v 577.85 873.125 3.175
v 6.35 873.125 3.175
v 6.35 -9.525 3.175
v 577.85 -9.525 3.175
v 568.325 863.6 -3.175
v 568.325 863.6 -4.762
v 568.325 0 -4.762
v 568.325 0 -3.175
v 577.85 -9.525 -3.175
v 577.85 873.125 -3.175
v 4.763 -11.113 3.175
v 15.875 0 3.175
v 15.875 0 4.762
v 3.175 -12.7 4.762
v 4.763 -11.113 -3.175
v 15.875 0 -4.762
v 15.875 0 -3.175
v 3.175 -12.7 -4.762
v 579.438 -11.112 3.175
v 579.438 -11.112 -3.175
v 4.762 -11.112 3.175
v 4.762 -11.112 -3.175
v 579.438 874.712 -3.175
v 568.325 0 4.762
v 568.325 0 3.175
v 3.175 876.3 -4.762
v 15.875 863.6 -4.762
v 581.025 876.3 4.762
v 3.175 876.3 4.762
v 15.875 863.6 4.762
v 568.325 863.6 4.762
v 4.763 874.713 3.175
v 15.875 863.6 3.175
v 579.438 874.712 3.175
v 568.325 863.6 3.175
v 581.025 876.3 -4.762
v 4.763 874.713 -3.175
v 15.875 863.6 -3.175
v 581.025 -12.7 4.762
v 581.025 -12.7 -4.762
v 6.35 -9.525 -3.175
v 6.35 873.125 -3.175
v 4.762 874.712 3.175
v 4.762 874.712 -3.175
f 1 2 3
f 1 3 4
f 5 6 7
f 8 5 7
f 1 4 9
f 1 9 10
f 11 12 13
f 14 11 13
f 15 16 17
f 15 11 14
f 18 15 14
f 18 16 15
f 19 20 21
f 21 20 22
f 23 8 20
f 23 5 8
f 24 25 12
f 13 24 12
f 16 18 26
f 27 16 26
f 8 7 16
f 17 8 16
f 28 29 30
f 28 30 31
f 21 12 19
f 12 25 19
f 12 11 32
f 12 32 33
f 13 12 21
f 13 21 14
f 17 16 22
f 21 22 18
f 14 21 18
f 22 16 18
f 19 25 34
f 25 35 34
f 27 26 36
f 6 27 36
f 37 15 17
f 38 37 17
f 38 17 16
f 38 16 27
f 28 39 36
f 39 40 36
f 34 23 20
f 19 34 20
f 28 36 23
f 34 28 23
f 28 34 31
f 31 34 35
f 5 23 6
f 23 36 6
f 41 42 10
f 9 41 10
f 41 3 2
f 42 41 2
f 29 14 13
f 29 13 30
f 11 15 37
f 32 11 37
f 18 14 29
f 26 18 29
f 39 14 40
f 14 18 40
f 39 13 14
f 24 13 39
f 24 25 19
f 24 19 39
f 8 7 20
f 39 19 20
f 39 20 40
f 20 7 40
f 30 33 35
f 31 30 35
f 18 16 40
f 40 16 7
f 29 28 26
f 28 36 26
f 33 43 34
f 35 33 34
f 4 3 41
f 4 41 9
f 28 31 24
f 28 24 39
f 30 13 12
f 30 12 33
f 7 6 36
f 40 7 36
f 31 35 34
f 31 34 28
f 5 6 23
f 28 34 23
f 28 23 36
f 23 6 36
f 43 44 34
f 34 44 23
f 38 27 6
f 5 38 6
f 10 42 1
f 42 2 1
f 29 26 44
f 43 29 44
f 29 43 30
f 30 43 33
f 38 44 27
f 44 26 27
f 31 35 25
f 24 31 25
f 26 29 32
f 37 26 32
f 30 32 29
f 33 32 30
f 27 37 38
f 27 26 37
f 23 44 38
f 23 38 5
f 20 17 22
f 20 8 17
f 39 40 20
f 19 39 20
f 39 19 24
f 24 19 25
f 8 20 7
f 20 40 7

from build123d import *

# Parameters (mm, degrees)
SKETCH2_W               = 577.85
SKETCH2_H               = 889
BOSS_EXTRUDE1_DEPTH     = 4.7625
SKETCH3_W               = 552.45
SKETCH3_H               = 863.6
CUT_EXTRUDE1_DEPTH      = 1052.466816523
CUT_EXTRUDE2_DEPTH      = 3.175
CUT_EXTRUDE2_DEPTH_BACK = 3.175
SKETCH4_W               = 574.675
SKETCH4_H               = 885.825
SPLIT1_START            = -4.7625
SPLIT1_DEPTH            = 9.525
SPLIT1_2_DEPTH          = 1.5875
SPLIT1_START_2          = 3.175
SPLIT1_3_DEPTH          = 1.5875
SPLIT1_START_3          = -3.175
SPLIT1_4_DEPTH          = 6.35
SPLIT1_5_DEPTH          = 1.5875
SPLIT1_6_DEPTH          = 1.5875
SPLIT1_7_DEPTH          = 6.35
SPLIT1_8_DEPTH          = 1.5875
SPLIT1_9_DEPTH          = 1.5875
SPLIT1_10_DEPTH         = 6.35
SKETCH6_W               = 571.5
SKETCH6_H               = 882.65
BOSS_EXTRUDE2_DEPTH     = 3.175


# Read off the part's stored shape, not the designer's step: Split1
with BuildPart() as part:
    # Sketch2 → Boss-Extrude1 (new, symmetric)
    with BuildSketch(Plane.XY):
        with Locations((292.1, 431.8)):
            Rectangle(SKETCH2_W, SKETCH2_H)
    extrude(amount=BOSS_EXTRUDE1_DEPTH, both=True)

    # Sketch3 → Cut-Extrude1 (cut, through all)
    with BuildSketch(Plane.XY.offset(4.7625)):
        with Locations((292.1, 431.8)):
            Rectangle(SKETCH3_W, SKETCH3_H)
    extrude(amount=-CUT_EXTRUDE1_DEPTH, mode=Mode.SUBTRACT)

    # Sketch4 → Cut-Extrude2 (cut, two sides: drawn at the far end of the back side and taken through both)
    with BuildSketch(Plane.XY.offset(-CUT_EXTRUDE2_DEPTH_BACK)):
        with Locations((292.1, 431.8)):
            Rectangle(SKETCH4_W, SKETCH4_H)
    extrude(amount=CUT_EXTRUDE2_DEPTH + CUT_EXTRUDE2_DEPTH_BACK, mode=Mode.SUBTRACT)

    # Split1 outline → Split1 (cut)
    with BuildSketch(Plane.XY.offset(SPLIT1_START)):
        Polygon((581.025, 876.3), (3.175, 876.3), (15.875, 863.6), (568.325, 863.6), (568.325, 0), (15.875, 0), (3.175, -12.7), (581.025, -12.7), align=None)
    extrude(amount=SPLIT1_DEPTH, mode=Mode.SUBTRACT)


with BuildPart() as body_2:
    # Split1 2 outline → Split1 2 (new body)
    with BuildSketch(Plane.XY.offset(SPLIT1_START)):
        Polygon((581.025, 876.3), (3.175, 876.3), (15.875, 863.6), (568.325, 863.6), align=None)
    extrude(amount=SPLIT1_2_DEPTH)

    # Split1 3 outline → Split1 3 (add)
    with BuildSketch(Plane.XY.offset(SPLIT1_START_2)):
        Polygon((581.025, 876.3), (3.175, 876.3), (15.875, 863.6), (568.325, 863.6), align=None)
    extrude(amount=SPLIT1_3_DEPTH)

    # Split1 4 outline → Split1 4 (add)
    with BuildSketch(Plane.XY.offset(SPLIT1_START_3)):
        Polygon((579.4375, 874.7125), (581.025, 876.3), (3.175, 876.3), (4.7625, 874.7125), align=None)
    extrude(amount=SPLIT1_4_DEPTH)


with BuildPart() as body_3:
    # Split1 5 outline → Split1 5 (new body)
    with BuildSketch(Plane.XY.offset(SPLIT1_START)):
        Polygon((581.025, -12.7), (581.025, 876.3), (568.325, 863.6), (568.325, 0), align=None)
    extrude(amount=SPLIT1_5_DEPTH)

    # Split1 6 outline → Split1 6 (add)
    with BuildSketch(Plane.XY.offset(SPLIT1_START_2)):
        Polygon((581.025, -12.7), (581.025, 876.3), (568.325, 863.6), (568.325, 0), align=None)
    extrude(amount=SPLIT1_6_DEPTH)

    # Split1 7 outline → Split1 7 (add)
    with BuildSketch(Plane.XY.offset(SPLIT1_START_3)):
        Polygon((579.4375, -11.1125), (581.025, -12.7), (581.025, 876.3), (579.4375, 874.7125), align=None)
    extrude(amount=SPLIT1_7_DEPTH)


with BuildPart() as body_4:
    # Split1 8 outline → Split1 8 (new body)
    with BuildSketch(Plane.XY.offset(SPLIT1_START)):
        Polygon((3.175, -12.7), (581.025, -12.7), (568.325, 0), (15.875, 0), align=None)
    extrude(amount=SPLIT1_8_DEPTH)

    # Split1 9 outline → Split1 9 (add)
    with BuildSketch(Plane.XY.offset(SPLIT1_START_2)):
        Polygon((3.175, -12.7), (581.025, -12.7), (568.325, 0), (15.875, 0), align=None)
    extrude(amount=SPLIT1_9_DEPTH)

    # Split1 10 outline → Split1 10 (add)
    with BuildSketch(Plane.XY.offset(SPLIT1_START_3)):
        Polygon((4.7625, -11.1125), (3.175, -12.7), (581.025, -12.7), (579.4375, -11.1125), align=None)
    extrude(amount=SPLIT1_10_DEPTH)


with BuildPart() as body_5:
    # Sketch6 → Boss-Extrude2 (new, symmetric)
    with BuildSketch(Plane.XY):
        with Locations((292.1, 431.8)):
            Rectangle(SKETCH6_W, SKETCH6_H)
    extrude(amount=BOSS_EXTRUDE2_DEPTH, both=True)


solid = Compound([part.part, body_2.part, body_3.part, body_4.part, body_5.part])
